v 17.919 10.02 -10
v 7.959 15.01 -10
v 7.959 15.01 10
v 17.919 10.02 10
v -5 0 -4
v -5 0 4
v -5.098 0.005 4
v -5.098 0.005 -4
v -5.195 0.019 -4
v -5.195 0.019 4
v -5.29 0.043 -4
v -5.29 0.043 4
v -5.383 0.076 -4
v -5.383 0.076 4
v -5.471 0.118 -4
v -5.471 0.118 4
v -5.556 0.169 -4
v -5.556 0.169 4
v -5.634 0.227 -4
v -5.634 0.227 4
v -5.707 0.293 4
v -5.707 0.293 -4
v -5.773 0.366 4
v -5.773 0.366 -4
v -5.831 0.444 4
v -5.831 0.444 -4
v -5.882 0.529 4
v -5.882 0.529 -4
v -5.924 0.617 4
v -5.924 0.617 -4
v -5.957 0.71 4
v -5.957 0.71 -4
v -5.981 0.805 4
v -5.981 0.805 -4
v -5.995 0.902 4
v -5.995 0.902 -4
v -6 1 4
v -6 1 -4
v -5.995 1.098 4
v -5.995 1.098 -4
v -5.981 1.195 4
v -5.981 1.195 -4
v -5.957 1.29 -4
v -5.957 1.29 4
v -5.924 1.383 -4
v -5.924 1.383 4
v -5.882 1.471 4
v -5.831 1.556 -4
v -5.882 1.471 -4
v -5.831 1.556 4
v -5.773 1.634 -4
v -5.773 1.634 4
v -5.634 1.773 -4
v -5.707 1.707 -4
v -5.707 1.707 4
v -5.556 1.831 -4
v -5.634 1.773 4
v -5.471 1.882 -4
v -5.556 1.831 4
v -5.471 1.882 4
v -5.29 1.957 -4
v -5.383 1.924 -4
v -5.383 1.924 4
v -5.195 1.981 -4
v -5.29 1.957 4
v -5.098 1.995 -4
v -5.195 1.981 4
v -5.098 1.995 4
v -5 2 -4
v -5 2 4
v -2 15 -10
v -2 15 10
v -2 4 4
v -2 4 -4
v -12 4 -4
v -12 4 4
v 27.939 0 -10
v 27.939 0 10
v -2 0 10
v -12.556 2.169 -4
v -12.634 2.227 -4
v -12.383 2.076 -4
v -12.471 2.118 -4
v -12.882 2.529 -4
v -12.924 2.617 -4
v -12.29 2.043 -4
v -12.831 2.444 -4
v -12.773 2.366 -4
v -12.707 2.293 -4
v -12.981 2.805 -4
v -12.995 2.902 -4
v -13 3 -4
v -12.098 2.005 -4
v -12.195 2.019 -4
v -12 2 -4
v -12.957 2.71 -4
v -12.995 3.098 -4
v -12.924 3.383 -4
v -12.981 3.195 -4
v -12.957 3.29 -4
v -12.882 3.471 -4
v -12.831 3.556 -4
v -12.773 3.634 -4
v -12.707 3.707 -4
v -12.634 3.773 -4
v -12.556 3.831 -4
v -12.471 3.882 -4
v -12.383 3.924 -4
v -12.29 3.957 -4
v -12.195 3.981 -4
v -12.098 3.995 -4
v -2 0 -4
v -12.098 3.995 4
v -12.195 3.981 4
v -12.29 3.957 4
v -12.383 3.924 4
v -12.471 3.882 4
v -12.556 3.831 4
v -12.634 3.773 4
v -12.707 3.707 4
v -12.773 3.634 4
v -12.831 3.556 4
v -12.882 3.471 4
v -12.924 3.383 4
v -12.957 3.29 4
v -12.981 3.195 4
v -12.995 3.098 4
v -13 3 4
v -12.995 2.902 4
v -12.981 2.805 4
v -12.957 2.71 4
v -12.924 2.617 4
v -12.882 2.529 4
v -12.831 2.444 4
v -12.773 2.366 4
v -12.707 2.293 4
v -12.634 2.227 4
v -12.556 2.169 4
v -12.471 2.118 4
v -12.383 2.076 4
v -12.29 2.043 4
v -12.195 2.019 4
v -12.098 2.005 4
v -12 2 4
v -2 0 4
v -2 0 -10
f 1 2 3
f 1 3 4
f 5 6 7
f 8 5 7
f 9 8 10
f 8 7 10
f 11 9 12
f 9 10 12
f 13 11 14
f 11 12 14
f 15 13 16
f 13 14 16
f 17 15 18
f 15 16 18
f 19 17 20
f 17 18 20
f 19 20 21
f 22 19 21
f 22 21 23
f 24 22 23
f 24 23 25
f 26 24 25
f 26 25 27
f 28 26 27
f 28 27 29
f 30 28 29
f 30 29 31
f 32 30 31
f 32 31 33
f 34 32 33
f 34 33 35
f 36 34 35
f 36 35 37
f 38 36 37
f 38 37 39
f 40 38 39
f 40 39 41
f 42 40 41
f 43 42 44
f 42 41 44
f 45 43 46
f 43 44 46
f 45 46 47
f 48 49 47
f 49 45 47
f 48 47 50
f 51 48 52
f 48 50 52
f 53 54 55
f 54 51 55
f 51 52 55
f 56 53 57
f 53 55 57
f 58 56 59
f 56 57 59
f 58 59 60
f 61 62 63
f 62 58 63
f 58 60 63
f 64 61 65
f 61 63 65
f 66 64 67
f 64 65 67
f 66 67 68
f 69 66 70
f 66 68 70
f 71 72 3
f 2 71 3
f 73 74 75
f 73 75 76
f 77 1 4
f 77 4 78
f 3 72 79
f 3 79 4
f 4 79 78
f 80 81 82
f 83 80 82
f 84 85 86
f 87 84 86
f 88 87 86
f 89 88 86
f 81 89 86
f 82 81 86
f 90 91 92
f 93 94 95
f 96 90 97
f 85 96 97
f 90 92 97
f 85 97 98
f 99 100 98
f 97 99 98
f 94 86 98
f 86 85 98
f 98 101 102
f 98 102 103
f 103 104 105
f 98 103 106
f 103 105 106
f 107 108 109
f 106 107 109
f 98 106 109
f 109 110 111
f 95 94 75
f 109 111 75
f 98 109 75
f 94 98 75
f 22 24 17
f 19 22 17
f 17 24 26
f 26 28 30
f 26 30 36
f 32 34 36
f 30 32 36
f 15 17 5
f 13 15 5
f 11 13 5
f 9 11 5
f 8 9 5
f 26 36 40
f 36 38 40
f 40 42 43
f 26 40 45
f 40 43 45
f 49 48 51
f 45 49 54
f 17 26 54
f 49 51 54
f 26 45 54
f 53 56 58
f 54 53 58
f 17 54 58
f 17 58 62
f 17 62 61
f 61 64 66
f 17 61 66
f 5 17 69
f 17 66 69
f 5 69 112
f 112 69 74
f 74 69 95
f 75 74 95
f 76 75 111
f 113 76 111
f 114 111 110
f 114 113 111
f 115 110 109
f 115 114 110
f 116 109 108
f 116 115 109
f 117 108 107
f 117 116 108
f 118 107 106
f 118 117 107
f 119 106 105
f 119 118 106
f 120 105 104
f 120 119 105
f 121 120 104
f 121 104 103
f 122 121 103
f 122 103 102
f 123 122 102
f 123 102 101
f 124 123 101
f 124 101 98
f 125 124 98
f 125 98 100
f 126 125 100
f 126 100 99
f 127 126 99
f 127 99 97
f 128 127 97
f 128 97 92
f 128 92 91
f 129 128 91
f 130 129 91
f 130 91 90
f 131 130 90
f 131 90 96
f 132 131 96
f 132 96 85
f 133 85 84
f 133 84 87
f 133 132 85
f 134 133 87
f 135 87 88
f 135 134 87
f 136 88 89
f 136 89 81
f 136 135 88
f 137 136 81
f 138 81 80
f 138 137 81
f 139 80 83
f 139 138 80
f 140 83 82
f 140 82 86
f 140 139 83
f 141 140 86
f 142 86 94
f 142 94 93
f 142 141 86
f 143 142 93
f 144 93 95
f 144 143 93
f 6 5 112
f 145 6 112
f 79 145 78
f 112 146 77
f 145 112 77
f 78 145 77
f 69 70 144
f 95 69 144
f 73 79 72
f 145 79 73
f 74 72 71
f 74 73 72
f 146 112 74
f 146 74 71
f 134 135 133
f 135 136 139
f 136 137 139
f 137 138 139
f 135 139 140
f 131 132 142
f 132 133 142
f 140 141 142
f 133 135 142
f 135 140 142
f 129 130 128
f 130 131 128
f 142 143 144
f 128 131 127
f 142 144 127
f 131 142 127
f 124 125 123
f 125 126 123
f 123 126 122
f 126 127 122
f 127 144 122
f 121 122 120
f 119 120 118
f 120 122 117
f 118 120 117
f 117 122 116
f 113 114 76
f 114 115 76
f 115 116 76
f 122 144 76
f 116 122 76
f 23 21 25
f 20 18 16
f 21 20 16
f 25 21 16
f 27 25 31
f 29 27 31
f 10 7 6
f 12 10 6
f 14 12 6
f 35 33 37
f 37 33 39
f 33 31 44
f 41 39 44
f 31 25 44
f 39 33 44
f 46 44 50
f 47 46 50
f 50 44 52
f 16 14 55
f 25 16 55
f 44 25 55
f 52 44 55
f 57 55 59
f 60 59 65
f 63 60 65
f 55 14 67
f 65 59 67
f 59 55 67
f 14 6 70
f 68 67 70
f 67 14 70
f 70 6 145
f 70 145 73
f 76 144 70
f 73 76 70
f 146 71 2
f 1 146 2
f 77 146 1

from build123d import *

# Parameters (mm, degrees)
SKETCH_1_W          = 40
SKETCH_1_H          = 20
EXTRUDE_1_DEPTH     = 20
SKETCH_2_W          = 8
SKETCH_2_H          = 4
EXTRUDE_2_DEPTH     = 10
CUT_EXTRUDE_8_DEPTH = 20
SKETCH_13_R         = 1
EXTRUDE_5_DEPTH     = 8
CUT_EXTRUDE_9_DEPTH = 20


with BuildPart() as part:
    # 草图1 → 凸台-拉伸1 (new body)
    with BuildSketch(Plane(origin=(0, 0, 0), x_dir=(1, 0, 0), z_dir=(0, 1, 0))):
        with Locations((18, 0)):
            Rectangle(SKETCH_1_W, SKETCH_1_H)
    extrude(amount=EXTRUDE_1_DEPTH)

    # 草图2 → 凸台-拉伸2 (add)
    with BuildSketch(Plane.ZY.offset(2)):
        with Locations((0, 2)):
            Rectangle(SKETCH_2_W, SKETCH_2_H)
    extrude(amount=EXTRUDE_2_DEPTH)

    # 草图12 → 切除-拉伸8 (cut)
    with BuildSketch(Plane.XY.offset(4)):
        with BuildLine():
            Line((-5, 2), (-18.474771325, 2))
            Line((-18.474771325, 2), (-18.474771325, 0))
            Line((-18.474771325, 0), (-5, 0))
            ThreePointArc((-5, 0), (-6, 1), (-5, 2))
        make_face()
    extrude(amount=-CUT_EXTRUDE_8_DEPTH, mode=Mode.SUBTRACT)

    # 草图13 → 凸台-拉伸5 (add)
    with BuildSketch(Plane.XY.offset(4)):
        with Locations((-12, 3)):
            Circle(SKETCH_13_R)
    extrude(amount=-EXTRUDE_5_DEPTH)

    # 草图14 → 切除-拉伸9 (cut)
    with BuildSketch(Plane.XY.offset(10)):
        Polygon((40.736846826, 20.947387303), (-2, 20), (-2, 15), (7.959394399, 15.0101514), (17.918788798, 10.020302801), (27.939091598, 0), (43.275764459, 0), align=None)
    extrude(amount=-CUT_EXTRUDE_9_DEPTH, mode=Mode.SUBTRACT)


solid = part.part
